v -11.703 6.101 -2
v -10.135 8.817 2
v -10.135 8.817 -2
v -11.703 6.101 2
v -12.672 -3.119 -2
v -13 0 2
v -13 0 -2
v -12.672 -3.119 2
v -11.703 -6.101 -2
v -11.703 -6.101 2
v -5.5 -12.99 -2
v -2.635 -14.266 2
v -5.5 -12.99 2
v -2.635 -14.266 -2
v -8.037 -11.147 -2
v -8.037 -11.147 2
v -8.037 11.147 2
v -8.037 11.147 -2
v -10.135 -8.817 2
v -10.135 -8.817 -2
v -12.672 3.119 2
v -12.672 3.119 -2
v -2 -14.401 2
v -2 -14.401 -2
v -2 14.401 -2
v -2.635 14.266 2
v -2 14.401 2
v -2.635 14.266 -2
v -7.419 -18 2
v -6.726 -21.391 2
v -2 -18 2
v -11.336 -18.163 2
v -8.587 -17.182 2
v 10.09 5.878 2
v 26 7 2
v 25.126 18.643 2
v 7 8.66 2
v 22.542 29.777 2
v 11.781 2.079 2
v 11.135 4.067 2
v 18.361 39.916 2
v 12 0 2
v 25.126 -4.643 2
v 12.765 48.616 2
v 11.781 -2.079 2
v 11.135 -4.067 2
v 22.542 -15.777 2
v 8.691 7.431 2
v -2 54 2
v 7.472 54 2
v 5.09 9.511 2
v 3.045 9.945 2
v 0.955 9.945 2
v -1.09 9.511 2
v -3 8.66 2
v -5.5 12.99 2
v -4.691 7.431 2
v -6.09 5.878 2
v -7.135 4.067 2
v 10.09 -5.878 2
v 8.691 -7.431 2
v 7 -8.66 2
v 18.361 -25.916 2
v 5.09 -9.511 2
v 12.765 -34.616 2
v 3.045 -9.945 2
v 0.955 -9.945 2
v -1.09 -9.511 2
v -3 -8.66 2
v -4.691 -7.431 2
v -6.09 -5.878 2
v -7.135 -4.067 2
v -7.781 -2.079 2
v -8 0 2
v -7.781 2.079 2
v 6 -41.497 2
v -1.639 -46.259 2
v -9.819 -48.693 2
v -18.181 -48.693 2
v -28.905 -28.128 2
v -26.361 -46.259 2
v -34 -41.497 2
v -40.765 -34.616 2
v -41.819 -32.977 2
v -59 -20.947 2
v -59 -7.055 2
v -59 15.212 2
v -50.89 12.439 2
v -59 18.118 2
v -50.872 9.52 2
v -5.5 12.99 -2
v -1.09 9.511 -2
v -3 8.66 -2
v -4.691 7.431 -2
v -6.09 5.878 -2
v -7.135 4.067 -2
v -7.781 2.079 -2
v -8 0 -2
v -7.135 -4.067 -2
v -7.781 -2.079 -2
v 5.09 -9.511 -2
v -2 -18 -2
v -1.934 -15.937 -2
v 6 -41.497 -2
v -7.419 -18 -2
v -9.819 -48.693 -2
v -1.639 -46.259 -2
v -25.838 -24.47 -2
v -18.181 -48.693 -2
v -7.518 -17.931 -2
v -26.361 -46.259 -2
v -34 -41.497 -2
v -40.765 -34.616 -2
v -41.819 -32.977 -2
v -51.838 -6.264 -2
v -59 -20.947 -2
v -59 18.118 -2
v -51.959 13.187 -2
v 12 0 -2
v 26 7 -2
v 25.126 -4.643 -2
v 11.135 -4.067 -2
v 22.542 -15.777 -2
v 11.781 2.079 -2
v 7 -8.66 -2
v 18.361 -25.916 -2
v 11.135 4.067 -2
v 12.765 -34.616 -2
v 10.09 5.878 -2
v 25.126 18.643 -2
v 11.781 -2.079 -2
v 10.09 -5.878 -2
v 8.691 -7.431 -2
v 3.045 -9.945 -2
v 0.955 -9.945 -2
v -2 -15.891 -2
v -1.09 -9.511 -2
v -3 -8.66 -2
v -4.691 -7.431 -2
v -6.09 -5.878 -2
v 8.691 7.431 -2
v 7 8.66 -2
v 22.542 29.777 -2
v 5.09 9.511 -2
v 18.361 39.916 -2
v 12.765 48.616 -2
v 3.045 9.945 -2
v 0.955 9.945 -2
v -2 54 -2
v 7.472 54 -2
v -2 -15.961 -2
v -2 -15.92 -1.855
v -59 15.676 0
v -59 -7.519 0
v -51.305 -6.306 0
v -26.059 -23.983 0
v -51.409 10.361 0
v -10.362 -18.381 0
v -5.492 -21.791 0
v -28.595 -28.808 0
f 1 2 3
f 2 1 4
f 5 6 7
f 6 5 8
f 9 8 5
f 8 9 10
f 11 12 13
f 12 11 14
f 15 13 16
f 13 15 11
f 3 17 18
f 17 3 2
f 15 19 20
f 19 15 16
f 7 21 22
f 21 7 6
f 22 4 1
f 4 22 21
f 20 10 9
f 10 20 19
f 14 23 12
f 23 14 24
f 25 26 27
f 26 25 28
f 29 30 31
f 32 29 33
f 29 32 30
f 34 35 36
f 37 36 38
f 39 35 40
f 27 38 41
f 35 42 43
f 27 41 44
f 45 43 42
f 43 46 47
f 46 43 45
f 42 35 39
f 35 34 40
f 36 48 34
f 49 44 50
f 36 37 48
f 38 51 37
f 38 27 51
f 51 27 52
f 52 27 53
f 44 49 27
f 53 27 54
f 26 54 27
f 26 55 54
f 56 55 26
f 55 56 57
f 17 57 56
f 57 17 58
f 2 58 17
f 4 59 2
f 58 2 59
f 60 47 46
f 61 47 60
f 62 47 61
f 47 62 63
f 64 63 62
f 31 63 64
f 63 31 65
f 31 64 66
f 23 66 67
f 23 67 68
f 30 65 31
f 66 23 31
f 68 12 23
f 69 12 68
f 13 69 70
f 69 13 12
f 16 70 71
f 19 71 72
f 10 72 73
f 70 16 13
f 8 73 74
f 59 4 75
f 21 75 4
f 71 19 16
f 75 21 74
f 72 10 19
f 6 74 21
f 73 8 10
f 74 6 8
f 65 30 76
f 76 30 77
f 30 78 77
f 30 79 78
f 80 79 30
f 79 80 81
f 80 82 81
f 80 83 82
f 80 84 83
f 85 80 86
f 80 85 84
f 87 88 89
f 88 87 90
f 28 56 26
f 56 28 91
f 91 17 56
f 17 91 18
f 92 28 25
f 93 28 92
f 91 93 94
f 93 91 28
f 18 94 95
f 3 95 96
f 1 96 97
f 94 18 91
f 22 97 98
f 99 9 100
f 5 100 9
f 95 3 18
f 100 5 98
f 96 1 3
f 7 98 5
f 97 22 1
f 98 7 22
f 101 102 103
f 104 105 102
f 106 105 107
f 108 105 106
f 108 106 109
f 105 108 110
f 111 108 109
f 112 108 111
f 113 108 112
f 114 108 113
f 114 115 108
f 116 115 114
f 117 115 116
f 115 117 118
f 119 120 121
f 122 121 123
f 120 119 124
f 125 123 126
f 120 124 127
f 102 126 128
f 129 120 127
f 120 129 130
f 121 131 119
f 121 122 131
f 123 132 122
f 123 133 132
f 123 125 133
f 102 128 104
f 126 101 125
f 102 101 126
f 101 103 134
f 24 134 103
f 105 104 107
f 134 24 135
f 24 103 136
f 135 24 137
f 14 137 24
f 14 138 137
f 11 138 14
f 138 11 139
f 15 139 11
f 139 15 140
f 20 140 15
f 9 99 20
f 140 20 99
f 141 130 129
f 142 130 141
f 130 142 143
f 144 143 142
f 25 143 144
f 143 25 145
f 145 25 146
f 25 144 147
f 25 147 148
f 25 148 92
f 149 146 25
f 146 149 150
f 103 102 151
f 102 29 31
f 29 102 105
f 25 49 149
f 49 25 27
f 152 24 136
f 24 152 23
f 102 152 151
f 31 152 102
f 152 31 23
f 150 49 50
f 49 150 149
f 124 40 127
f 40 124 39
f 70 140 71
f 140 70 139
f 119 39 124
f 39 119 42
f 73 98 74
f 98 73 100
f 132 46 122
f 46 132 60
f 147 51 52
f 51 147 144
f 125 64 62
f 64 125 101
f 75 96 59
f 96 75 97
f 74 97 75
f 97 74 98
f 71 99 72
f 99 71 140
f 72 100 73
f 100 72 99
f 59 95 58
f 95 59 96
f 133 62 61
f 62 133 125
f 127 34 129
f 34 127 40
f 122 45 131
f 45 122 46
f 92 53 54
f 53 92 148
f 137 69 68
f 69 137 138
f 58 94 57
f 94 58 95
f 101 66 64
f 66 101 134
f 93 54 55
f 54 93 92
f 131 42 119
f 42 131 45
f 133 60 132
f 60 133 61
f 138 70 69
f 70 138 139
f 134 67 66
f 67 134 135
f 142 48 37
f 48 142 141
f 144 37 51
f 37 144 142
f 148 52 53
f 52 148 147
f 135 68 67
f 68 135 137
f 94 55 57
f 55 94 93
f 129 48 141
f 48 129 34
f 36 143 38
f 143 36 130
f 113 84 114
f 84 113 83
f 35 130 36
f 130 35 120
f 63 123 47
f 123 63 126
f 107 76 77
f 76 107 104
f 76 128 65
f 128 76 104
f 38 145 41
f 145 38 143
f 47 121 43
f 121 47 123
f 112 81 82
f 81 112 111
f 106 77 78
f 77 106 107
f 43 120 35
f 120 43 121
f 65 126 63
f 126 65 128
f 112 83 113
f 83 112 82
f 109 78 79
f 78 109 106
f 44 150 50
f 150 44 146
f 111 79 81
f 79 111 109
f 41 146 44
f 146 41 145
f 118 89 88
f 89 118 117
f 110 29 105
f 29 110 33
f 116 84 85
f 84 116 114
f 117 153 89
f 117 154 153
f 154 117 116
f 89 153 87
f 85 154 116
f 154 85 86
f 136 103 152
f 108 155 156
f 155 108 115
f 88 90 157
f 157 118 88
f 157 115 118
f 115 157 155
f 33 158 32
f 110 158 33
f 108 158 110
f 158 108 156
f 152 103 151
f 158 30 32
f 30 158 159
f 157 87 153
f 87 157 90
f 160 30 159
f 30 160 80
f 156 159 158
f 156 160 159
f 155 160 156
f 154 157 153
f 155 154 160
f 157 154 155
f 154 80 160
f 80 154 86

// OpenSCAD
union(){
difference(){
union(){
difference(){
union(){
difference(){
union(){
difference(){
union(){
linear_extrude(height = 4, center = true, convexity = 10, twist = 0)
translate([2, 0, 0])
circle(r = 15);

translate([0,-32,0])scale([20,7,1])cube(4,center=true);

translate([12,4,0])scale([7,25,1])cube(4,center=true);



rotate([0,0,-35]) translate([0,-40,0])scale([25,9,1])cube(4,center=true);}

linear_extrude(height = 7, center = true, convexity = 10, twist = 0)
translate([2, 0, 0])
circle(r = 10);}}

translate([-6,7,0])union(){
difference(){

translate([-10,0,0]) scale([1,1.4,1]) linear_extrude(height = 7, center = true, convexity = 10, twist = 0)
translate([2, 0, 0])
circle(r = 80);

translate([-10,0,0]) scale([1,1.4,1]) linear_extrude(height = 9, center = true, convexity = 10, twist = 0)
translate([2, 0, 0])
circle(r = 40);}}}}

}


difference(){
rotate([0,0,-35]) translate([-30,-35,0])scale([20,8,1])cube(4,center=true);


rotate([0,0,90]) translate([0,75,0])scale([20,8,2])cube(4,center=true);
}}
union()

rotate([0,0,55]) translate([-35,23,-3]) polyhedron(
  points=[ [21,31,0],[21,-31,0],[0,-16.1,0],[0,16.1,0], // the four points at base
           [9.5,0,70]  ],                                 // the apex point 
  faces=[ [0,1,4],[1,2,4],[2,3,4],[3,0,4],              // each triangle side
              [1,0,3],[2,1,3] ]                         // two triangles for square base
 );


rotate([0,0,55]) translate([-40,23,0]) polyhedron(
  points=[ [19,40,0],[19,-31,0],[0,-16.1,0],[0,40.1,0], // the four points at base
           [9.5,0,50]  ],                                 // the apex point 
  faces=[ [0,1,4],[1,2,4],[2,3,4],[3,0,4],              // each triangle side
              [1,0,3],[2,1,3] ]                         // two triangles for square base
 );}



}
